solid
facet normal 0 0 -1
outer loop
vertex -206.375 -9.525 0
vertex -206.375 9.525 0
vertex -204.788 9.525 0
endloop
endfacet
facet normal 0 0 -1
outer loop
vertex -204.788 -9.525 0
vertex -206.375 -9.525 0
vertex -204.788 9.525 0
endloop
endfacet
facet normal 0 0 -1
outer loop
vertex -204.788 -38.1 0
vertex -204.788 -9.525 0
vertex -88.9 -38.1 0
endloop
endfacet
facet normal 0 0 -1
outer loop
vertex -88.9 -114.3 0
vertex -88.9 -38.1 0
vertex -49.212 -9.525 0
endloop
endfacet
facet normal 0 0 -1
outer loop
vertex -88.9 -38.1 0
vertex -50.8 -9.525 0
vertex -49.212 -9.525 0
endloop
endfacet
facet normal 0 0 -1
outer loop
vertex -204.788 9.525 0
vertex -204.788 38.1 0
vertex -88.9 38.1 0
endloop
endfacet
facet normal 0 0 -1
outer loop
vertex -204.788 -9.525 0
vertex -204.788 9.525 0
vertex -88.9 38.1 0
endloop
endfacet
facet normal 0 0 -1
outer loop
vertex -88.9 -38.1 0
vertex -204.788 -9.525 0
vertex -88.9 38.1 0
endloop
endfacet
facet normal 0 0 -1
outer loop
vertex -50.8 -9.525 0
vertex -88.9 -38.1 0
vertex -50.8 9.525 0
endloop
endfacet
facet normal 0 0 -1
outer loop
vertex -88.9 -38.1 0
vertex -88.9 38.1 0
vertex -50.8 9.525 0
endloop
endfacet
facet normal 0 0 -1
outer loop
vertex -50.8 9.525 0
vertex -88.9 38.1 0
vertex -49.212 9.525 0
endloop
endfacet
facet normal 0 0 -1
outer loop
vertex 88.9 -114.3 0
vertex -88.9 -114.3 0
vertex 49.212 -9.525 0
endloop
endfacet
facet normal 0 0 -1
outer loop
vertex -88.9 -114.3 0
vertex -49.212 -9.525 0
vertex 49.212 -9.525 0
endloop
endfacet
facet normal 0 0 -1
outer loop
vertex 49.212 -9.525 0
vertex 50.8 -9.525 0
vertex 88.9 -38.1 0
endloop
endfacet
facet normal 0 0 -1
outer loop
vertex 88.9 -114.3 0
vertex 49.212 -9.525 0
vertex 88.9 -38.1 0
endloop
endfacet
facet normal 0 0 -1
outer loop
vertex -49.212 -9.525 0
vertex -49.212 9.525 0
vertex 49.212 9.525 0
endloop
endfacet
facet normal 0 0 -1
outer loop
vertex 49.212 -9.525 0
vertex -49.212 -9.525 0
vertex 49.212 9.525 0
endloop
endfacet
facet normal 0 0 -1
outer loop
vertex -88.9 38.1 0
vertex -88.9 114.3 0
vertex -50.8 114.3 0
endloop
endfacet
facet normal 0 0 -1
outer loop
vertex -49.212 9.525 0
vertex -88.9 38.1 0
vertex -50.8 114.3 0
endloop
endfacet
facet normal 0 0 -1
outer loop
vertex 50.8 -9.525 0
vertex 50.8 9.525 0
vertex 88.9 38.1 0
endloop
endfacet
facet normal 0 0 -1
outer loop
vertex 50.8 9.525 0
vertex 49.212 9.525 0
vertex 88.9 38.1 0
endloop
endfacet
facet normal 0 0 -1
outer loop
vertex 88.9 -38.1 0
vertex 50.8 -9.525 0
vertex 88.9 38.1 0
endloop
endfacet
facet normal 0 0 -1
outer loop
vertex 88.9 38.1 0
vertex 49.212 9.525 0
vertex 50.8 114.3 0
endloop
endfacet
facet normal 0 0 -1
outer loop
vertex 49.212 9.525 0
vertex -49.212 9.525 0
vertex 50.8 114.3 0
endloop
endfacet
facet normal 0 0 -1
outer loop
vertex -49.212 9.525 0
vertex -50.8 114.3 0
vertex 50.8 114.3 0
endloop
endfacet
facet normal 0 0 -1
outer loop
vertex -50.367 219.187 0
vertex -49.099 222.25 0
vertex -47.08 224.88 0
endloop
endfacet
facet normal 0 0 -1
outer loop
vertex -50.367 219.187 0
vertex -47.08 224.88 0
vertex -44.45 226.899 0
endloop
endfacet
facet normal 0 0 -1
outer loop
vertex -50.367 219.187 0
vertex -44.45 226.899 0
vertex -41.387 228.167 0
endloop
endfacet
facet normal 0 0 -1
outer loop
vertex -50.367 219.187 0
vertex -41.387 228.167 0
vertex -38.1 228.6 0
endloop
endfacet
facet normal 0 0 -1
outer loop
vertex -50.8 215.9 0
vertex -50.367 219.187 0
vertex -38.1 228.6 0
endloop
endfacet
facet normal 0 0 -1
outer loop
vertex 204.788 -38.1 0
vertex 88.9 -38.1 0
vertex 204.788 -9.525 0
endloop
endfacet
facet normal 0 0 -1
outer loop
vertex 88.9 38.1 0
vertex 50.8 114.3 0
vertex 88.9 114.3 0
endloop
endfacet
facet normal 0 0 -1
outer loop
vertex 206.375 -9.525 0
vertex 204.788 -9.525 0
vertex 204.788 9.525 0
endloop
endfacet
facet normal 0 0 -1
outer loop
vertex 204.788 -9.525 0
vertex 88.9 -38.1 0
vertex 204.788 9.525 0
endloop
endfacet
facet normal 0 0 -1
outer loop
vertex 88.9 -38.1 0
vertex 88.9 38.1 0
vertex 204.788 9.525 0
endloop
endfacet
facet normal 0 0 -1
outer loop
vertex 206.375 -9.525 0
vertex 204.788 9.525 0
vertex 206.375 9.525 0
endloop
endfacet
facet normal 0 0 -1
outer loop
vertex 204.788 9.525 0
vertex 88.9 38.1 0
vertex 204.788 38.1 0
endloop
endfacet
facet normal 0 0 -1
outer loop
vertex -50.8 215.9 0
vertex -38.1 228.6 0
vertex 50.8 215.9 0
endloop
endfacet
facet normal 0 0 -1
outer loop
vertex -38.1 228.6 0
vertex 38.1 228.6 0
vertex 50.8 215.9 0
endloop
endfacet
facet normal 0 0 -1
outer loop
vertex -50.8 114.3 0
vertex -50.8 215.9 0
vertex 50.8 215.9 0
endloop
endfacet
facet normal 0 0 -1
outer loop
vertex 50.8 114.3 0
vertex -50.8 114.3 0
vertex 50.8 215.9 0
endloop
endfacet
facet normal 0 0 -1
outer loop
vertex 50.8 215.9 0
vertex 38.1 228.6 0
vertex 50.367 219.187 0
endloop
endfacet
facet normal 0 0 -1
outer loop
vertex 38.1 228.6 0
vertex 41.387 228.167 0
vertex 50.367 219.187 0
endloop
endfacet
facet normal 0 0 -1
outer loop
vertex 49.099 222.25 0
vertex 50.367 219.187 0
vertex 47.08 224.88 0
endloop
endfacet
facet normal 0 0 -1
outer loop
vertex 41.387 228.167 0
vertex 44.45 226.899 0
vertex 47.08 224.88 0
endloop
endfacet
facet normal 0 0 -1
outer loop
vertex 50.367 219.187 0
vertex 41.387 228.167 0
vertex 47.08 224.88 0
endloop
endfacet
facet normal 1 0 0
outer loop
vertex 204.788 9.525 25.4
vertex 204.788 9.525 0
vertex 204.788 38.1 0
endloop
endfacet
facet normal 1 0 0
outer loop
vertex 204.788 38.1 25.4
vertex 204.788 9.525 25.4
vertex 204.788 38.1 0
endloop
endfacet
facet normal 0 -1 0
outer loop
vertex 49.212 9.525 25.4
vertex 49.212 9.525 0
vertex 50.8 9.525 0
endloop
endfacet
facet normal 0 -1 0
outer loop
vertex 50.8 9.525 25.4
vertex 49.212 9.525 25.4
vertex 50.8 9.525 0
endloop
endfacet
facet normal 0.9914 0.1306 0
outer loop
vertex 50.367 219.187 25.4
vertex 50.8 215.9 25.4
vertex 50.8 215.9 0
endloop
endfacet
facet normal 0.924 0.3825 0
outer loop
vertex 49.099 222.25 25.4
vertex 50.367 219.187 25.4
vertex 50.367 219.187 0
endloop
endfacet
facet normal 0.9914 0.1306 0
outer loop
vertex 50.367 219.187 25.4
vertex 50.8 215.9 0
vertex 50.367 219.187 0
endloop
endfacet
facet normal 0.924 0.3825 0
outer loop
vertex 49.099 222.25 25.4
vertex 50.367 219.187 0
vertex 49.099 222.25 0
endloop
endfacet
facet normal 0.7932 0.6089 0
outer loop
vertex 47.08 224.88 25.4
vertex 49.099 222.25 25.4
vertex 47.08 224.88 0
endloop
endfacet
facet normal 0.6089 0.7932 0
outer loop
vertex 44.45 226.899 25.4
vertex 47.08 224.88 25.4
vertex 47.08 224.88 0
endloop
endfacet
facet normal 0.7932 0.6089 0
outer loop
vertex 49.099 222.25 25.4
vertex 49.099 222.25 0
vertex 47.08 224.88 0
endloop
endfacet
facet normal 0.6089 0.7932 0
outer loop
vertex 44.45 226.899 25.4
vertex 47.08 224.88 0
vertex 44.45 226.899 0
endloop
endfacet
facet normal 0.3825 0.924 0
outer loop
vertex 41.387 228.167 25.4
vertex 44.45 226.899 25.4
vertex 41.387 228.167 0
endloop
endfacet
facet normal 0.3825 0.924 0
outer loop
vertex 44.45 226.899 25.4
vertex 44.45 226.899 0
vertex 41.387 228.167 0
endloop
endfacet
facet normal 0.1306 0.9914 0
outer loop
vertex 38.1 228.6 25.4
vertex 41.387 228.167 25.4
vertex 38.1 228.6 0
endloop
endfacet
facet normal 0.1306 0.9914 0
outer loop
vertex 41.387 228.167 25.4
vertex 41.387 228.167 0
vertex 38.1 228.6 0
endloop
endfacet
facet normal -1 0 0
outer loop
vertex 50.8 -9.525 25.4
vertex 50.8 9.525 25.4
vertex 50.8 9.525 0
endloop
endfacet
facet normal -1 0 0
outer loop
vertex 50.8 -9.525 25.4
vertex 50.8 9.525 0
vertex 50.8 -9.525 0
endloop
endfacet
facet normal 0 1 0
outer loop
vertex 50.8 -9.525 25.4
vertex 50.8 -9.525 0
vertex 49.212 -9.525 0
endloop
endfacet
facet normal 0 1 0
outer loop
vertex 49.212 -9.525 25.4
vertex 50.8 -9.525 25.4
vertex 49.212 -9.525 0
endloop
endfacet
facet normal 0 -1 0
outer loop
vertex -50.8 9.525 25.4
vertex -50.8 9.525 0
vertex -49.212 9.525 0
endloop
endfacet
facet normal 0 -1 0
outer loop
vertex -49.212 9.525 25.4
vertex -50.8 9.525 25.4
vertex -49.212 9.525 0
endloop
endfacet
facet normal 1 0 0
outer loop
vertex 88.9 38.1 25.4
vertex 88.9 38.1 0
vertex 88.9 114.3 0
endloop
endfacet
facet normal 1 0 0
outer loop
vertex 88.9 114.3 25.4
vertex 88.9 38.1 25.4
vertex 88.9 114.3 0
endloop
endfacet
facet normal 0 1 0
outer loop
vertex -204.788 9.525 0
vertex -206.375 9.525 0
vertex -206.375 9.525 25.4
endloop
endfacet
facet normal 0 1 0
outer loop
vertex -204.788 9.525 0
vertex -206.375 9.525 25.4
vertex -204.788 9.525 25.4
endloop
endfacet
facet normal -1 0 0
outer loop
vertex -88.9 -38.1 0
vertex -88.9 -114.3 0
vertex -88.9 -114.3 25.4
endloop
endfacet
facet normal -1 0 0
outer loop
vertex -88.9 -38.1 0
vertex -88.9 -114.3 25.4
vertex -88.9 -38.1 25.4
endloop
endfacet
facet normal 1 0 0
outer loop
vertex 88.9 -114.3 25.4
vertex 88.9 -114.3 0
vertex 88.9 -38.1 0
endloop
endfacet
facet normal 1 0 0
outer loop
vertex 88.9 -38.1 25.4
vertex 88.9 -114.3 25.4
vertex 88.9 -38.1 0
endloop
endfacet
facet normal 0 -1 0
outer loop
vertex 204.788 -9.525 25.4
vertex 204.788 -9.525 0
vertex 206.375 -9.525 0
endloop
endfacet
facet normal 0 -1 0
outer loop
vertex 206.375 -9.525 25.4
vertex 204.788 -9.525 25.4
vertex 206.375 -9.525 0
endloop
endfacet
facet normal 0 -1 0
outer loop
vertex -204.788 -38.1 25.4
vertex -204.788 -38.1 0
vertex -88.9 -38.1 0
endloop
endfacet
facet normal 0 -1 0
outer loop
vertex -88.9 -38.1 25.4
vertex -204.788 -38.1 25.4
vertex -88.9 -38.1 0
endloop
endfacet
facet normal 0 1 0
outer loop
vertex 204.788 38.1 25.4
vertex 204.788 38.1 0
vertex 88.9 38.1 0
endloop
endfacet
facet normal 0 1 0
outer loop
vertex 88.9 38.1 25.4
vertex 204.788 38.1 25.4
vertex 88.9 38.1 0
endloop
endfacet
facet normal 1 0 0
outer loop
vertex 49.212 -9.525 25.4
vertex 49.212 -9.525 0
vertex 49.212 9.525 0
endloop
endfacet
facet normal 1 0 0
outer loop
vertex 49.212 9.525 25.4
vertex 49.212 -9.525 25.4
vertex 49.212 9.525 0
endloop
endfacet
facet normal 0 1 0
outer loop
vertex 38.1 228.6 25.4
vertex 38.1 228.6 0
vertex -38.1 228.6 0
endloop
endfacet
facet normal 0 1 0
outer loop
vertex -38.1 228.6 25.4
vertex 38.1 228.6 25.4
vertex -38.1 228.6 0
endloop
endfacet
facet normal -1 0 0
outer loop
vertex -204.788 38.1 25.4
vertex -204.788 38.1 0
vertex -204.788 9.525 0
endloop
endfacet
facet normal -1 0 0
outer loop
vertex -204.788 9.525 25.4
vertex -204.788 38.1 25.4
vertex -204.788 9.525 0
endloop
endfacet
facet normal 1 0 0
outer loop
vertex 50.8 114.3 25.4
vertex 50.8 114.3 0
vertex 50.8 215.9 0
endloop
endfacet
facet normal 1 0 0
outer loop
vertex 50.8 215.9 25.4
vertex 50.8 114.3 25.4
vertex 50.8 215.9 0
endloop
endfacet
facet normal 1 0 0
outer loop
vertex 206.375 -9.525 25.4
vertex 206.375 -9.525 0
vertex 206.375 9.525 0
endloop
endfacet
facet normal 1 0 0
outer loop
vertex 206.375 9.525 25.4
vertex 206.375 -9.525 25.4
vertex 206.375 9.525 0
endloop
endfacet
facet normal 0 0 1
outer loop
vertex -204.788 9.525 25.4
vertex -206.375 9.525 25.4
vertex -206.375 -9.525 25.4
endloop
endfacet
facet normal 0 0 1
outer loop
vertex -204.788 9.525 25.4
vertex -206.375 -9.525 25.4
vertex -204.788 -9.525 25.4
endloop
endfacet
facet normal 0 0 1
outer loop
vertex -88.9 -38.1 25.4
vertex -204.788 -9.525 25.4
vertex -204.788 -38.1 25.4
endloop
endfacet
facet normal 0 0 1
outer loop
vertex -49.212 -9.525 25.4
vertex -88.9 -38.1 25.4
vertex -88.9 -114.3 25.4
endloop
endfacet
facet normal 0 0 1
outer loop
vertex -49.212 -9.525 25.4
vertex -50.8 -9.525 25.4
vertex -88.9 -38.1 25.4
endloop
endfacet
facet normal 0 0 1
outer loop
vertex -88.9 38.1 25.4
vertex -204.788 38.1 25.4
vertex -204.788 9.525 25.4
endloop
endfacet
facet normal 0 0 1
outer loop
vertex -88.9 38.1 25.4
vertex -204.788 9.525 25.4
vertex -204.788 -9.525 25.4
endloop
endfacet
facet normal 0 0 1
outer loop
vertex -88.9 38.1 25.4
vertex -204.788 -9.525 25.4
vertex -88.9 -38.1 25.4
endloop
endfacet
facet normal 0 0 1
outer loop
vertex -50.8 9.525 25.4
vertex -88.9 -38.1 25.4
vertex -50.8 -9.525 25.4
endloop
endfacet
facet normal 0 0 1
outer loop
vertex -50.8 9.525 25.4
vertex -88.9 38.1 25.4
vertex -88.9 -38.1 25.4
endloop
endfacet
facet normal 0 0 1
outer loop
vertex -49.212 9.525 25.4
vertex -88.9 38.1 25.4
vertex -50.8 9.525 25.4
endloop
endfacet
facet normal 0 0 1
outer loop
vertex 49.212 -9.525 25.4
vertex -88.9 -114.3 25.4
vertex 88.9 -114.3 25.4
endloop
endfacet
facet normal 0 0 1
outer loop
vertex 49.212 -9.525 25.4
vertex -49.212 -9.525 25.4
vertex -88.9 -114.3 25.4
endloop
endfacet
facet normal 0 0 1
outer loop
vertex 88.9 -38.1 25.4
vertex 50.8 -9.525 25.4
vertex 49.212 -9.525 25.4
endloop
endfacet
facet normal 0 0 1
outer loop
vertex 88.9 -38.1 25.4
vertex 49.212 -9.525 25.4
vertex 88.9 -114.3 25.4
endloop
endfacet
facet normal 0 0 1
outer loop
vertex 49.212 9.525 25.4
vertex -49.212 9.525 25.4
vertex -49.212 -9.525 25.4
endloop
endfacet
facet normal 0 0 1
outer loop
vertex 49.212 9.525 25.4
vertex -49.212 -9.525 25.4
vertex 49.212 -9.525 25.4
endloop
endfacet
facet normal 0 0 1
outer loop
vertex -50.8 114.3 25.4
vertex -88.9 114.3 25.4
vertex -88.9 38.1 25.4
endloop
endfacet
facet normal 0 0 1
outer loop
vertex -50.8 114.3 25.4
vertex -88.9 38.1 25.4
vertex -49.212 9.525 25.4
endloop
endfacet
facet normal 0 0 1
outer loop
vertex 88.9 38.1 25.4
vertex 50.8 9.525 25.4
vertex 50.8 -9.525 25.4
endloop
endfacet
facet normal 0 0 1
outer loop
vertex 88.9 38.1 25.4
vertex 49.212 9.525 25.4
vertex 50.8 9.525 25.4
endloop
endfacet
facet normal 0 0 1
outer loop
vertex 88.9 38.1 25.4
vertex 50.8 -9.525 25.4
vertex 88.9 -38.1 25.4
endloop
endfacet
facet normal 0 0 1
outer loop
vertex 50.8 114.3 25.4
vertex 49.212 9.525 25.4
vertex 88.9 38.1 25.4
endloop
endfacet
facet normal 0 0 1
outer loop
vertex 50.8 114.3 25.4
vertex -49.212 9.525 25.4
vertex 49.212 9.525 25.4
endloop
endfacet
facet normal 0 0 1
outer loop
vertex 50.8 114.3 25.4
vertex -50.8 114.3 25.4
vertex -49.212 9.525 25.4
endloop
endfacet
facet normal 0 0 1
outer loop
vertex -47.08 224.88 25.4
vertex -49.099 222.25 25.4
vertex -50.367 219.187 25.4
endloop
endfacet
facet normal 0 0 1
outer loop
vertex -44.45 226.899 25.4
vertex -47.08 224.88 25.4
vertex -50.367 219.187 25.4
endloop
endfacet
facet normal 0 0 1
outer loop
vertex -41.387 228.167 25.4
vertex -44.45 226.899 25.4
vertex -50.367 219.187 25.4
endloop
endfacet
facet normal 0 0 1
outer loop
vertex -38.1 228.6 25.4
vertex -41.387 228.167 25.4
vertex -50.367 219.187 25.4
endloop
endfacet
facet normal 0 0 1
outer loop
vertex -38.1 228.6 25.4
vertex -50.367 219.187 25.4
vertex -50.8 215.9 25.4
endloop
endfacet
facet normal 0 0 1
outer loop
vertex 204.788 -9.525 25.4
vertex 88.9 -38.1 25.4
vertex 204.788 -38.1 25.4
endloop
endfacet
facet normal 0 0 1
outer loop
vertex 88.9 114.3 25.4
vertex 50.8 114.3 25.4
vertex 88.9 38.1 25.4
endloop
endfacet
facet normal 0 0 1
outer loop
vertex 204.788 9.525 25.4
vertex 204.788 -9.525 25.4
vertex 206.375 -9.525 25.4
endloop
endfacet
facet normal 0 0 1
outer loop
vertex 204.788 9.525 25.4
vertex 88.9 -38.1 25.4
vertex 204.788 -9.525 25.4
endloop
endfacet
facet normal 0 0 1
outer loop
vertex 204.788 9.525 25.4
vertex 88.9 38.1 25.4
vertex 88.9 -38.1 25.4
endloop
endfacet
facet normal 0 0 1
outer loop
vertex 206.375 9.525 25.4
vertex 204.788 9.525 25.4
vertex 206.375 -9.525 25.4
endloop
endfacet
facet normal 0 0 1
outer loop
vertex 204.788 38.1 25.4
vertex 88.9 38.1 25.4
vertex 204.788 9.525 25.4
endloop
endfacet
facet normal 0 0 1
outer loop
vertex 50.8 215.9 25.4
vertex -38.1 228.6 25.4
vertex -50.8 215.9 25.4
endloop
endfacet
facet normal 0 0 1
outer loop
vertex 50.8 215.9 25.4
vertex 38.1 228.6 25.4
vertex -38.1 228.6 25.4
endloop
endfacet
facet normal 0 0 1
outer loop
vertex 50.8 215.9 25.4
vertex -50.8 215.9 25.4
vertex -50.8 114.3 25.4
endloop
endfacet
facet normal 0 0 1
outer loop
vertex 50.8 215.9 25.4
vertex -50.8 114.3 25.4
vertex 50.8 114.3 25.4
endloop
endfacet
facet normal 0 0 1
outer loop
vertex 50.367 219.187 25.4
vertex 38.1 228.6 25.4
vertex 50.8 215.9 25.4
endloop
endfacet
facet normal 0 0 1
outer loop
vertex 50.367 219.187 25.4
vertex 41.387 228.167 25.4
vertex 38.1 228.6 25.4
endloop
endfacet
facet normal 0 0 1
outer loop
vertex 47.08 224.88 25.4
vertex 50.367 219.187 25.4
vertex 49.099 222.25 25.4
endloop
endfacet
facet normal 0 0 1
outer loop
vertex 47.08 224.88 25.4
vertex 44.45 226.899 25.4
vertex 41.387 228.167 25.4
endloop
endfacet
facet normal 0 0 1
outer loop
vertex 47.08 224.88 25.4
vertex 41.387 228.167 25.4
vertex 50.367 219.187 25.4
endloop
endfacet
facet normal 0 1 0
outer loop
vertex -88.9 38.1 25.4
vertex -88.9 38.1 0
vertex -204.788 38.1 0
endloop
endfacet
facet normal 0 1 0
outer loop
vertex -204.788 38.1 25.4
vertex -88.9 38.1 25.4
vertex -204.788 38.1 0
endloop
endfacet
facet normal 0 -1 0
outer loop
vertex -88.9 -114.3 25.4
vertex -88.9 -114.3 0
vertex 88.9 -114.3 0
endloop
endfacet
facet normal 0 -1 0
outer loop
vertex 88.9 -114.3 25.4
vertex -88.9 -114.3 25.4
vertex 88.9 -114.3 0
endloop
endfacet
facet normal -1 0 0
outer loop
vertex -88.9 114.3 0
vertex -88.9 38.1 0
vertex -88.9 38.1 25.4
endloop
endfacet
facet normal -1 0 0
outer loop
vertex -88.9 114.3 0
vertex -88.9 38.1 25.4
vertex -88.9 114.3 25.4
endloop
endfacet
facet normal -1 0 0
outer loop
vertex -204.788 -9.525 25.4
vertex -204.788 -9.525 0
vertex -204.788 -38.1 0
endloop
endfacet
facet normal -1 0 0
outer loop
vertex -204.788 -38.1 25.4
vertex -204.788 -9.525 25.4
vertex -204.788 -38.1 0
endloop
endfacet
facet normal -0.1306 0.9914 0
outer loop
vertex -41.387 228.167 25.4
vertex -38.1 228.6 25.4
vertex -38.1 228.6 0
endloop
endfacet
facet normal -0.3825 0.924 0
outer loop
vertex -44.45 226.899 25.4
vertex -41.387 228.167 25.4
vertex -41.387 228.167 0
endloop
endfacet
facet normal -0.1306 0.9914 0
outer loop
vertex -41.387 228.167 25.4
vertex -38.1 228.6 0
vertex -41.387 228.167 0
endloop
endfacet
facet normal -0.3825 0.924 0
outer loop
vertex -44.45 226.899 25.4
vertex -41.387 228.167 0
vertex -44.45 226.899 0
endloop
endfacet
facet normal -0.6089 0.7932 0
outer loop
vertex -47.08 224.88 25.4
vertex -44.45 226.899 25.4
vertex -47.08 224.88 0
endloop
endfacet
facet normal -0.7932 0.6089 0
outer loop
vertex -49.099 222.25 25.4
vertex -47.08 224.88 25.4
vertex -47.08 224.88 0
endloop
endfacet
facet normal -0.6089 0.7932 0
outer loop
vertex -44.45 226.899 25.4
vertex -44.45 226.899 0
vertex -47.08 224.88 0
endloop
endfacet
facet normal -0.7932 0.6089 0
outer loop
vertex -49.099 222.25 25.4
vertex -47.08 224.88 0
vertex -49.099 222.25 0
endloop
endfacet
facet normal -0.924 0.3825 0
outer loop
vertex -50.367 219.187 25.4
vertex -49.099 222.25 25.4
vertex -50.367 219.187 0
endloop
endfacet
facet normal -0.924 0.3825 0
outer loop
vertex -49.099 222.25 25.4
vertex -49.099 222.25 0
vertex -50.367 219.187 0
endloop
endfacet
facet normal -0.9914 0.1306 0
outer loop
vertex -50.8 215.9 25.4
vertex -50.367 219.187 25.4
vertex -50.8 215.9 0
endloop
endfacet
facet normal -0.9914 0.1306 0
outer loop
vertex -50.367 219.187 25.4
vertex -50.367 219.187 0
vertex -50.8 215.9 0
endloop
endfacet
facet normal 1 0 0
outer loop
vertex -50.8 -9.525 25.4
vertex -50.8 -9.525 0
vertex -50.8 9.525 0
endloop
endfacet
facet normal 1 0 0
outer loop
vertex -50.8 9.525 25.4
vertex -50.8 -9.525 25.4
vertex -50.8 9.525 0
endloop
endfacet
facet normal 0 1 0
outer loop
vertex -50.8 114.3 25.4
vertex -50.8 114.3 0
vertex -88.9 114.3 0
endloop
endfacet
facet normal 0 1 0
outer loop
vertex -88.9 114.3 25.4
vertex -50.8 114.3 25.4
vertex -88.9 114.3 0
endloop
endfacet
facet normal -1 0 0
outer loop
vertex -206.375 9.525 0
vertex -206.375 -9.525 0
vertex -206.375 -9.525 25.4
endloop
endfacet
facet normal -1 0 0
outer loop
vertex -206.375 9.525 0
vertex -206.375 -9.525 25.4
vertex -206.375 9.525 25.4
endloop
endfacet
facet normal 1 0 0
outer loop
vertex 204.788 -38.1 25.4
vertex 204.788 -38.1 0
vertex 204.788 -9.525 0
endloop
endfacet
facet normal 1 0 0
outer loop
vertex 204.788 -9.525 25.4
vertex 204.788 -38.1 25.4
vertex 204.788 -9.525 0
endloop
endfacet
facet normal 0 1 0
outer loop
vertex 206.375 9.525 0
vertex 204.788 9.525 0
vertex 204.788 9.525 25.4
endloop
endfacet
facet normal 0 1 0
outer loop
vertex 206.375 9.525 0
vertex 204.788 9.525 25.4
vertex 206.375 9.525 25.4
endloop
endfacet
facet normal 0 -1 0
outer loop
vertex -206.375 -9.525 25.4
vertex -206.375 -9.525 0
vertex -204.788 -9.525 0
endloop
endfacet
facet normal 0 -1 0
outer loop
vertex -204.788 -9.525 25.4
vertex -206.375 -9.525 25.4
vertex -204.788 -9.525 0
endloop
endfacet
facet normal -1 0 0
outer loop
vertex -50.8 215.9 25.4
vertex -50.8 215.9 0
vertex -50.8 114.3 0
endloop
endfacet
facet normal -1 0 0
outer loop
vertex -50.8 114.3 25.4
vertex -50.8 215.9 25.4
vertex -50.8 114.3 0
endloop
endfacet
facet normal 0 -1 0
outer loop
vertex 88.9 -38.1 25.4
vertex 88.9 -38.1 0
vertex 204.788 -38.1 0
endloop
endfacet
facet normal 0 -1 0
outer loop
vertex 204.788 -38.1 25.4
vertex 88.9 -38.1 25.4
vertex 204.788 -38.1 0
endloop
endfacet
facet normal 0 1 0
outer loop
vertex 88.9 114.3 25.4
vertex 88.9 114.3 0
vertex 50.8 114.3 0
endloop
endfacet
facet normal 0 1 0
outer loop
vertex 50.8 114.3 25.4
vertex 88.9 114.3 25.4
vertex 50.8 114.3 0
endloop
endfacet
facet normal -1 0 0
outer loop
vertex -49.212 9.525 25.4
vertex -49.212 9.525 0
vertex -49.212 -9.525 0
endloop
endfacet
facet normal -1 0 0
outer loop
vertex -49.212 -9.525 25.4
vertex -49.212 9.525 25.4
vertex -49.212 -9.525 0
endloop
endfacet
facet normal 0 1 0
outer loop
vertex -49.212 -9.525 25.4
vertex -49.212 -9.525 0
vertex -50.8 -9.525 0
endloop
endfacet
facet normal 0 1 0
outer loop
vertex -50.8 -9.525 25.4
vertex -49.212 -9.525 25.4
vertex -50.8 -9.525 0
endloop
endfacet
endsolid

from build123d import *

# Parameters (mm, degrees)
F0_W     = 38.1
F0_H     = 76.2
F0_W_2   = 101.6
F0_W_3   = 1.5875
F0_H_2   = 19.05
F1_DEPTH = 25.4


with BuildPart() as f1:
    # F0 (on Top) → F1 (new body)
    with BuildSketch(Plane.XY):
        Polygon((88.9, 38.1), (50.8, 38.1), (50.8, 9.525), (50.8, -9.525), (50.8, -38.1), (88.9, -38.1), (127, -38.1), (127, 38.1), align=None)
        with Locations((69.85, 76.2)):
            Rectangle(F0_W, F0_H)
        with Locations((0, 76.2)):
            Rectangle(F0_W_2, F0_H)
        Polygon((-50.8, 9.525), (-50.8, 38.1), (-88.9, 38.1), (-127, 38.1), (-127, -38.1), (-88.9, -38.1), (-50.8, -38.1), (-50.8, -9.525), align=None)
        with Locations((-69.85, 76.2)):
            Rectangle(F0_W, F0_H)
        with Locations((0, 152.4)):
            Rectangle(F0_W_2, F0_H)
        with Locations((127.79375, 0)):
            Rectangle(F0_W_3, F0_H)
        with BuildLine():
            Line((-50.8, 190.5), (50.8, 190.5))
            Line((50.8, 190.5), (50.8, 215.9))
            ThreePointArc((50.8, 215.9), (47.0802561211, 224.8802561211), (38.1, 228.6))
            Line((38.1, 228.6), (-38.1, 228.6))
            ThreePointArc((-38.1, 228.6), (-47.0802561211, 224.8802561211), (-50.8, 215.9))
            Line((-50.8, 215.9), (-50.8, 190.5))
        make_face()
        with Locations((-127.79375, 0)):
            Rectangle(F0_W_3, F0_H)
        with Locations((0, -76.2)):
            Rectangle(F0_W_2, F0_H)
        with Locations((69.85, -76.2)):
            Rectangle(F0_W, F0_H)
        Polygon((204.7875, 38.1), (128.5875, 38.1), (128.5875, -38.1), (204.7875, -38.1), (204.7875, -9.525), (204.7875, 9.525), align=None)
        with Locations((-69.85, -76.2)):
            Rectangle(F0_W, F0_H)
        Polygon((-128.5875, -38.1), (-128.5875, 38.1), (-204.7875, 38.1), (-204.7875, 9.525), (-204.7875, -9.525), (-204.7875, -38.1), align=None)
        with Locations((205.58125, 0)):
            Rectangle(F0_W_3, F0_H_2)
        with Locations((-205.58125, 0)):
            Rectangle(F0_W_3, F0_H_2)
        Polygon((50.8, 9.525), (50.8, 38.1), (-50.8, 38.1), (-50.8, 9.525), (-49.2125, 9.525), (-49.2125, -9.525), (-50.8, -9.525), (-50.8, -38.1), (50.8, -38.1), (50.8, -9.525), (49.2125, -9.525), (49.2125, 9.525), align=None)
    extrude(amount=F1_DEPTH)


solid = f1.part
